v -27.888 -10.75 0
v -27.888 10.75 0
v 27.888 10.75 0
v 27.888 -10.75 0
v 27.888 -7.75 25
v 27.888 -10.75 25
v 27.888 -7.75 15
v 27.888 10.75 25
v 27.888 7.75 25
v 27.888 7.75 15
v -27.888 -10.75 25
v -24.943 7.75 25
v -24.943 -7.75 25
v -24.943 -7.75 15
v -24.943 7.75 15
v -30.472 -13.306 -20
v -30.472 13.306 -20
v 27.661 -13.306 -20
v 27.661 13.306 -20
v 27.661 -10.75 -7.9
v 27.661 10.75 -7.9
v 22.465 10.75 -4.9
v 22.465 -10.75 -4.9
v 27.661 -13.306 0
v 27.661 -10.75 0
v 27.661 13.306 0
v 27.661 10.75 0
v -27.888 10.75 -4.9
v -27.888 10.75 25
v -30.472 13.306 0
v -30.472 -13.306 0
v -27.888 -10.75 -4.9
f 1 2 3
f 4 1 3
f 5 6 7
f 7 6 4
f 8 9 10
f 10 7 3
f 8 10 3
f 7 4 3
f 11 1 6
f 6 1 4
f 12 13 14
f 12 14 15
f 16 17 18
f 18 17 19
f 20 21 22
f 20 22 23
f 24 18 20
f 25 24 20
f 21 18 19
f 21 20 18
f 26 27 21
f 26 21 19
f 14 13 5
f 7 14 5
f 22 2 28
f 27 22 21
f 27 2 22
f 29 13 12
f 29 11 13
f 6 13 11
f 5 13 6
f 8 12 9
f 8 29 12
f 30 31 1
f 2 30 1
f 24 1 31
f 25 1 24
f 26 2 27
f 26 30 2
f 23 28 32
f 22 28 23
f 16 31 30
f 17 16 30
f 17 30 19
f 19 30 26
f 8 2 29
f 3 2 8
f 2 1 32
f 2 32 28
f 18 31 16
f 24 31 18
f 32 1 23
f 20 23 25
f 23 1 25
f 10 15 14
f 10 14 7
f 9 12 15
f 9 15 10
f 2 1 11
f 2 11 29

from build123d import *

# Parameters (mm, degrees)
F0_W     = 55.7761411649
F0_H     = 21.5
F1_DEPTH = 25
F2_W     = 52.8311664967
F2_H     = 15.5
F3_DEPTH = 10
F4_W     = 58.1333647091
F4_H     = 26.6126239309
F5_DEPTH = 15
F6_DEPTH = 4.9
F7_DEPTH = 5
F8_SIZE2 = 3
F8_SIZE  = 5.1961524227


with BuildPart() as f1:
    # F0 (on Top) → F1 (new body)
    with BuildSketch(Plane.XY):
        Rectangle(F0_W, F0_H)
    extrude(amount=F1_DEPTH)

    # F2 (on face) → F3 (cut)
    with BuildSketch(Plane.XY.offset(25)):
        with Locations((1.4724873341, 0)):
            Rectangle(F2_W, F2_H)
    extrude(amount=-F3_DEPTH, mode=Mode.SUBTRACT)


with BuildPart() as f5:
    # F4 (on Top) → F5 (new body)
    with BuildSketch(Plane.XY):
        with Locations((-1.4055008069, 0)):
            Rectangle(F4_W, F4_H)
    extrude(amount=-F5_DEPTH)

    # F6 (cut): a face of the model
    f6_faces = [f1.part.faces().sort_by_distance(p)[0] for p in [
        (0, 0, 0),
    ]]
    extrude(f6_faces, amount=F6_DEPTH, mode=Mode.SUBTRACT)

    # F7 (add): a face of the model
    f7_faces = [f5.faces().sort_by_distance(p)[0] for p in [
        (-1.4055008069, 0, -15),
    ]]
    extrude(f7_faces, amount=F7_DEPTH)

    # F8
    f8_edges = [f5.edges().sort_by_distance(p)[0] for p in [
        (27.661182, 0, -4.9),
    ]]
    f8_side = f5.faces().sort_by_distance((-0.113445, 0, -4.9))[0]
    chamfer(f8_edges, length=F8_SIZE, length2=F8_SIZE2, reference=f8_side)


solid = Compound([f1.part, f5.part])
